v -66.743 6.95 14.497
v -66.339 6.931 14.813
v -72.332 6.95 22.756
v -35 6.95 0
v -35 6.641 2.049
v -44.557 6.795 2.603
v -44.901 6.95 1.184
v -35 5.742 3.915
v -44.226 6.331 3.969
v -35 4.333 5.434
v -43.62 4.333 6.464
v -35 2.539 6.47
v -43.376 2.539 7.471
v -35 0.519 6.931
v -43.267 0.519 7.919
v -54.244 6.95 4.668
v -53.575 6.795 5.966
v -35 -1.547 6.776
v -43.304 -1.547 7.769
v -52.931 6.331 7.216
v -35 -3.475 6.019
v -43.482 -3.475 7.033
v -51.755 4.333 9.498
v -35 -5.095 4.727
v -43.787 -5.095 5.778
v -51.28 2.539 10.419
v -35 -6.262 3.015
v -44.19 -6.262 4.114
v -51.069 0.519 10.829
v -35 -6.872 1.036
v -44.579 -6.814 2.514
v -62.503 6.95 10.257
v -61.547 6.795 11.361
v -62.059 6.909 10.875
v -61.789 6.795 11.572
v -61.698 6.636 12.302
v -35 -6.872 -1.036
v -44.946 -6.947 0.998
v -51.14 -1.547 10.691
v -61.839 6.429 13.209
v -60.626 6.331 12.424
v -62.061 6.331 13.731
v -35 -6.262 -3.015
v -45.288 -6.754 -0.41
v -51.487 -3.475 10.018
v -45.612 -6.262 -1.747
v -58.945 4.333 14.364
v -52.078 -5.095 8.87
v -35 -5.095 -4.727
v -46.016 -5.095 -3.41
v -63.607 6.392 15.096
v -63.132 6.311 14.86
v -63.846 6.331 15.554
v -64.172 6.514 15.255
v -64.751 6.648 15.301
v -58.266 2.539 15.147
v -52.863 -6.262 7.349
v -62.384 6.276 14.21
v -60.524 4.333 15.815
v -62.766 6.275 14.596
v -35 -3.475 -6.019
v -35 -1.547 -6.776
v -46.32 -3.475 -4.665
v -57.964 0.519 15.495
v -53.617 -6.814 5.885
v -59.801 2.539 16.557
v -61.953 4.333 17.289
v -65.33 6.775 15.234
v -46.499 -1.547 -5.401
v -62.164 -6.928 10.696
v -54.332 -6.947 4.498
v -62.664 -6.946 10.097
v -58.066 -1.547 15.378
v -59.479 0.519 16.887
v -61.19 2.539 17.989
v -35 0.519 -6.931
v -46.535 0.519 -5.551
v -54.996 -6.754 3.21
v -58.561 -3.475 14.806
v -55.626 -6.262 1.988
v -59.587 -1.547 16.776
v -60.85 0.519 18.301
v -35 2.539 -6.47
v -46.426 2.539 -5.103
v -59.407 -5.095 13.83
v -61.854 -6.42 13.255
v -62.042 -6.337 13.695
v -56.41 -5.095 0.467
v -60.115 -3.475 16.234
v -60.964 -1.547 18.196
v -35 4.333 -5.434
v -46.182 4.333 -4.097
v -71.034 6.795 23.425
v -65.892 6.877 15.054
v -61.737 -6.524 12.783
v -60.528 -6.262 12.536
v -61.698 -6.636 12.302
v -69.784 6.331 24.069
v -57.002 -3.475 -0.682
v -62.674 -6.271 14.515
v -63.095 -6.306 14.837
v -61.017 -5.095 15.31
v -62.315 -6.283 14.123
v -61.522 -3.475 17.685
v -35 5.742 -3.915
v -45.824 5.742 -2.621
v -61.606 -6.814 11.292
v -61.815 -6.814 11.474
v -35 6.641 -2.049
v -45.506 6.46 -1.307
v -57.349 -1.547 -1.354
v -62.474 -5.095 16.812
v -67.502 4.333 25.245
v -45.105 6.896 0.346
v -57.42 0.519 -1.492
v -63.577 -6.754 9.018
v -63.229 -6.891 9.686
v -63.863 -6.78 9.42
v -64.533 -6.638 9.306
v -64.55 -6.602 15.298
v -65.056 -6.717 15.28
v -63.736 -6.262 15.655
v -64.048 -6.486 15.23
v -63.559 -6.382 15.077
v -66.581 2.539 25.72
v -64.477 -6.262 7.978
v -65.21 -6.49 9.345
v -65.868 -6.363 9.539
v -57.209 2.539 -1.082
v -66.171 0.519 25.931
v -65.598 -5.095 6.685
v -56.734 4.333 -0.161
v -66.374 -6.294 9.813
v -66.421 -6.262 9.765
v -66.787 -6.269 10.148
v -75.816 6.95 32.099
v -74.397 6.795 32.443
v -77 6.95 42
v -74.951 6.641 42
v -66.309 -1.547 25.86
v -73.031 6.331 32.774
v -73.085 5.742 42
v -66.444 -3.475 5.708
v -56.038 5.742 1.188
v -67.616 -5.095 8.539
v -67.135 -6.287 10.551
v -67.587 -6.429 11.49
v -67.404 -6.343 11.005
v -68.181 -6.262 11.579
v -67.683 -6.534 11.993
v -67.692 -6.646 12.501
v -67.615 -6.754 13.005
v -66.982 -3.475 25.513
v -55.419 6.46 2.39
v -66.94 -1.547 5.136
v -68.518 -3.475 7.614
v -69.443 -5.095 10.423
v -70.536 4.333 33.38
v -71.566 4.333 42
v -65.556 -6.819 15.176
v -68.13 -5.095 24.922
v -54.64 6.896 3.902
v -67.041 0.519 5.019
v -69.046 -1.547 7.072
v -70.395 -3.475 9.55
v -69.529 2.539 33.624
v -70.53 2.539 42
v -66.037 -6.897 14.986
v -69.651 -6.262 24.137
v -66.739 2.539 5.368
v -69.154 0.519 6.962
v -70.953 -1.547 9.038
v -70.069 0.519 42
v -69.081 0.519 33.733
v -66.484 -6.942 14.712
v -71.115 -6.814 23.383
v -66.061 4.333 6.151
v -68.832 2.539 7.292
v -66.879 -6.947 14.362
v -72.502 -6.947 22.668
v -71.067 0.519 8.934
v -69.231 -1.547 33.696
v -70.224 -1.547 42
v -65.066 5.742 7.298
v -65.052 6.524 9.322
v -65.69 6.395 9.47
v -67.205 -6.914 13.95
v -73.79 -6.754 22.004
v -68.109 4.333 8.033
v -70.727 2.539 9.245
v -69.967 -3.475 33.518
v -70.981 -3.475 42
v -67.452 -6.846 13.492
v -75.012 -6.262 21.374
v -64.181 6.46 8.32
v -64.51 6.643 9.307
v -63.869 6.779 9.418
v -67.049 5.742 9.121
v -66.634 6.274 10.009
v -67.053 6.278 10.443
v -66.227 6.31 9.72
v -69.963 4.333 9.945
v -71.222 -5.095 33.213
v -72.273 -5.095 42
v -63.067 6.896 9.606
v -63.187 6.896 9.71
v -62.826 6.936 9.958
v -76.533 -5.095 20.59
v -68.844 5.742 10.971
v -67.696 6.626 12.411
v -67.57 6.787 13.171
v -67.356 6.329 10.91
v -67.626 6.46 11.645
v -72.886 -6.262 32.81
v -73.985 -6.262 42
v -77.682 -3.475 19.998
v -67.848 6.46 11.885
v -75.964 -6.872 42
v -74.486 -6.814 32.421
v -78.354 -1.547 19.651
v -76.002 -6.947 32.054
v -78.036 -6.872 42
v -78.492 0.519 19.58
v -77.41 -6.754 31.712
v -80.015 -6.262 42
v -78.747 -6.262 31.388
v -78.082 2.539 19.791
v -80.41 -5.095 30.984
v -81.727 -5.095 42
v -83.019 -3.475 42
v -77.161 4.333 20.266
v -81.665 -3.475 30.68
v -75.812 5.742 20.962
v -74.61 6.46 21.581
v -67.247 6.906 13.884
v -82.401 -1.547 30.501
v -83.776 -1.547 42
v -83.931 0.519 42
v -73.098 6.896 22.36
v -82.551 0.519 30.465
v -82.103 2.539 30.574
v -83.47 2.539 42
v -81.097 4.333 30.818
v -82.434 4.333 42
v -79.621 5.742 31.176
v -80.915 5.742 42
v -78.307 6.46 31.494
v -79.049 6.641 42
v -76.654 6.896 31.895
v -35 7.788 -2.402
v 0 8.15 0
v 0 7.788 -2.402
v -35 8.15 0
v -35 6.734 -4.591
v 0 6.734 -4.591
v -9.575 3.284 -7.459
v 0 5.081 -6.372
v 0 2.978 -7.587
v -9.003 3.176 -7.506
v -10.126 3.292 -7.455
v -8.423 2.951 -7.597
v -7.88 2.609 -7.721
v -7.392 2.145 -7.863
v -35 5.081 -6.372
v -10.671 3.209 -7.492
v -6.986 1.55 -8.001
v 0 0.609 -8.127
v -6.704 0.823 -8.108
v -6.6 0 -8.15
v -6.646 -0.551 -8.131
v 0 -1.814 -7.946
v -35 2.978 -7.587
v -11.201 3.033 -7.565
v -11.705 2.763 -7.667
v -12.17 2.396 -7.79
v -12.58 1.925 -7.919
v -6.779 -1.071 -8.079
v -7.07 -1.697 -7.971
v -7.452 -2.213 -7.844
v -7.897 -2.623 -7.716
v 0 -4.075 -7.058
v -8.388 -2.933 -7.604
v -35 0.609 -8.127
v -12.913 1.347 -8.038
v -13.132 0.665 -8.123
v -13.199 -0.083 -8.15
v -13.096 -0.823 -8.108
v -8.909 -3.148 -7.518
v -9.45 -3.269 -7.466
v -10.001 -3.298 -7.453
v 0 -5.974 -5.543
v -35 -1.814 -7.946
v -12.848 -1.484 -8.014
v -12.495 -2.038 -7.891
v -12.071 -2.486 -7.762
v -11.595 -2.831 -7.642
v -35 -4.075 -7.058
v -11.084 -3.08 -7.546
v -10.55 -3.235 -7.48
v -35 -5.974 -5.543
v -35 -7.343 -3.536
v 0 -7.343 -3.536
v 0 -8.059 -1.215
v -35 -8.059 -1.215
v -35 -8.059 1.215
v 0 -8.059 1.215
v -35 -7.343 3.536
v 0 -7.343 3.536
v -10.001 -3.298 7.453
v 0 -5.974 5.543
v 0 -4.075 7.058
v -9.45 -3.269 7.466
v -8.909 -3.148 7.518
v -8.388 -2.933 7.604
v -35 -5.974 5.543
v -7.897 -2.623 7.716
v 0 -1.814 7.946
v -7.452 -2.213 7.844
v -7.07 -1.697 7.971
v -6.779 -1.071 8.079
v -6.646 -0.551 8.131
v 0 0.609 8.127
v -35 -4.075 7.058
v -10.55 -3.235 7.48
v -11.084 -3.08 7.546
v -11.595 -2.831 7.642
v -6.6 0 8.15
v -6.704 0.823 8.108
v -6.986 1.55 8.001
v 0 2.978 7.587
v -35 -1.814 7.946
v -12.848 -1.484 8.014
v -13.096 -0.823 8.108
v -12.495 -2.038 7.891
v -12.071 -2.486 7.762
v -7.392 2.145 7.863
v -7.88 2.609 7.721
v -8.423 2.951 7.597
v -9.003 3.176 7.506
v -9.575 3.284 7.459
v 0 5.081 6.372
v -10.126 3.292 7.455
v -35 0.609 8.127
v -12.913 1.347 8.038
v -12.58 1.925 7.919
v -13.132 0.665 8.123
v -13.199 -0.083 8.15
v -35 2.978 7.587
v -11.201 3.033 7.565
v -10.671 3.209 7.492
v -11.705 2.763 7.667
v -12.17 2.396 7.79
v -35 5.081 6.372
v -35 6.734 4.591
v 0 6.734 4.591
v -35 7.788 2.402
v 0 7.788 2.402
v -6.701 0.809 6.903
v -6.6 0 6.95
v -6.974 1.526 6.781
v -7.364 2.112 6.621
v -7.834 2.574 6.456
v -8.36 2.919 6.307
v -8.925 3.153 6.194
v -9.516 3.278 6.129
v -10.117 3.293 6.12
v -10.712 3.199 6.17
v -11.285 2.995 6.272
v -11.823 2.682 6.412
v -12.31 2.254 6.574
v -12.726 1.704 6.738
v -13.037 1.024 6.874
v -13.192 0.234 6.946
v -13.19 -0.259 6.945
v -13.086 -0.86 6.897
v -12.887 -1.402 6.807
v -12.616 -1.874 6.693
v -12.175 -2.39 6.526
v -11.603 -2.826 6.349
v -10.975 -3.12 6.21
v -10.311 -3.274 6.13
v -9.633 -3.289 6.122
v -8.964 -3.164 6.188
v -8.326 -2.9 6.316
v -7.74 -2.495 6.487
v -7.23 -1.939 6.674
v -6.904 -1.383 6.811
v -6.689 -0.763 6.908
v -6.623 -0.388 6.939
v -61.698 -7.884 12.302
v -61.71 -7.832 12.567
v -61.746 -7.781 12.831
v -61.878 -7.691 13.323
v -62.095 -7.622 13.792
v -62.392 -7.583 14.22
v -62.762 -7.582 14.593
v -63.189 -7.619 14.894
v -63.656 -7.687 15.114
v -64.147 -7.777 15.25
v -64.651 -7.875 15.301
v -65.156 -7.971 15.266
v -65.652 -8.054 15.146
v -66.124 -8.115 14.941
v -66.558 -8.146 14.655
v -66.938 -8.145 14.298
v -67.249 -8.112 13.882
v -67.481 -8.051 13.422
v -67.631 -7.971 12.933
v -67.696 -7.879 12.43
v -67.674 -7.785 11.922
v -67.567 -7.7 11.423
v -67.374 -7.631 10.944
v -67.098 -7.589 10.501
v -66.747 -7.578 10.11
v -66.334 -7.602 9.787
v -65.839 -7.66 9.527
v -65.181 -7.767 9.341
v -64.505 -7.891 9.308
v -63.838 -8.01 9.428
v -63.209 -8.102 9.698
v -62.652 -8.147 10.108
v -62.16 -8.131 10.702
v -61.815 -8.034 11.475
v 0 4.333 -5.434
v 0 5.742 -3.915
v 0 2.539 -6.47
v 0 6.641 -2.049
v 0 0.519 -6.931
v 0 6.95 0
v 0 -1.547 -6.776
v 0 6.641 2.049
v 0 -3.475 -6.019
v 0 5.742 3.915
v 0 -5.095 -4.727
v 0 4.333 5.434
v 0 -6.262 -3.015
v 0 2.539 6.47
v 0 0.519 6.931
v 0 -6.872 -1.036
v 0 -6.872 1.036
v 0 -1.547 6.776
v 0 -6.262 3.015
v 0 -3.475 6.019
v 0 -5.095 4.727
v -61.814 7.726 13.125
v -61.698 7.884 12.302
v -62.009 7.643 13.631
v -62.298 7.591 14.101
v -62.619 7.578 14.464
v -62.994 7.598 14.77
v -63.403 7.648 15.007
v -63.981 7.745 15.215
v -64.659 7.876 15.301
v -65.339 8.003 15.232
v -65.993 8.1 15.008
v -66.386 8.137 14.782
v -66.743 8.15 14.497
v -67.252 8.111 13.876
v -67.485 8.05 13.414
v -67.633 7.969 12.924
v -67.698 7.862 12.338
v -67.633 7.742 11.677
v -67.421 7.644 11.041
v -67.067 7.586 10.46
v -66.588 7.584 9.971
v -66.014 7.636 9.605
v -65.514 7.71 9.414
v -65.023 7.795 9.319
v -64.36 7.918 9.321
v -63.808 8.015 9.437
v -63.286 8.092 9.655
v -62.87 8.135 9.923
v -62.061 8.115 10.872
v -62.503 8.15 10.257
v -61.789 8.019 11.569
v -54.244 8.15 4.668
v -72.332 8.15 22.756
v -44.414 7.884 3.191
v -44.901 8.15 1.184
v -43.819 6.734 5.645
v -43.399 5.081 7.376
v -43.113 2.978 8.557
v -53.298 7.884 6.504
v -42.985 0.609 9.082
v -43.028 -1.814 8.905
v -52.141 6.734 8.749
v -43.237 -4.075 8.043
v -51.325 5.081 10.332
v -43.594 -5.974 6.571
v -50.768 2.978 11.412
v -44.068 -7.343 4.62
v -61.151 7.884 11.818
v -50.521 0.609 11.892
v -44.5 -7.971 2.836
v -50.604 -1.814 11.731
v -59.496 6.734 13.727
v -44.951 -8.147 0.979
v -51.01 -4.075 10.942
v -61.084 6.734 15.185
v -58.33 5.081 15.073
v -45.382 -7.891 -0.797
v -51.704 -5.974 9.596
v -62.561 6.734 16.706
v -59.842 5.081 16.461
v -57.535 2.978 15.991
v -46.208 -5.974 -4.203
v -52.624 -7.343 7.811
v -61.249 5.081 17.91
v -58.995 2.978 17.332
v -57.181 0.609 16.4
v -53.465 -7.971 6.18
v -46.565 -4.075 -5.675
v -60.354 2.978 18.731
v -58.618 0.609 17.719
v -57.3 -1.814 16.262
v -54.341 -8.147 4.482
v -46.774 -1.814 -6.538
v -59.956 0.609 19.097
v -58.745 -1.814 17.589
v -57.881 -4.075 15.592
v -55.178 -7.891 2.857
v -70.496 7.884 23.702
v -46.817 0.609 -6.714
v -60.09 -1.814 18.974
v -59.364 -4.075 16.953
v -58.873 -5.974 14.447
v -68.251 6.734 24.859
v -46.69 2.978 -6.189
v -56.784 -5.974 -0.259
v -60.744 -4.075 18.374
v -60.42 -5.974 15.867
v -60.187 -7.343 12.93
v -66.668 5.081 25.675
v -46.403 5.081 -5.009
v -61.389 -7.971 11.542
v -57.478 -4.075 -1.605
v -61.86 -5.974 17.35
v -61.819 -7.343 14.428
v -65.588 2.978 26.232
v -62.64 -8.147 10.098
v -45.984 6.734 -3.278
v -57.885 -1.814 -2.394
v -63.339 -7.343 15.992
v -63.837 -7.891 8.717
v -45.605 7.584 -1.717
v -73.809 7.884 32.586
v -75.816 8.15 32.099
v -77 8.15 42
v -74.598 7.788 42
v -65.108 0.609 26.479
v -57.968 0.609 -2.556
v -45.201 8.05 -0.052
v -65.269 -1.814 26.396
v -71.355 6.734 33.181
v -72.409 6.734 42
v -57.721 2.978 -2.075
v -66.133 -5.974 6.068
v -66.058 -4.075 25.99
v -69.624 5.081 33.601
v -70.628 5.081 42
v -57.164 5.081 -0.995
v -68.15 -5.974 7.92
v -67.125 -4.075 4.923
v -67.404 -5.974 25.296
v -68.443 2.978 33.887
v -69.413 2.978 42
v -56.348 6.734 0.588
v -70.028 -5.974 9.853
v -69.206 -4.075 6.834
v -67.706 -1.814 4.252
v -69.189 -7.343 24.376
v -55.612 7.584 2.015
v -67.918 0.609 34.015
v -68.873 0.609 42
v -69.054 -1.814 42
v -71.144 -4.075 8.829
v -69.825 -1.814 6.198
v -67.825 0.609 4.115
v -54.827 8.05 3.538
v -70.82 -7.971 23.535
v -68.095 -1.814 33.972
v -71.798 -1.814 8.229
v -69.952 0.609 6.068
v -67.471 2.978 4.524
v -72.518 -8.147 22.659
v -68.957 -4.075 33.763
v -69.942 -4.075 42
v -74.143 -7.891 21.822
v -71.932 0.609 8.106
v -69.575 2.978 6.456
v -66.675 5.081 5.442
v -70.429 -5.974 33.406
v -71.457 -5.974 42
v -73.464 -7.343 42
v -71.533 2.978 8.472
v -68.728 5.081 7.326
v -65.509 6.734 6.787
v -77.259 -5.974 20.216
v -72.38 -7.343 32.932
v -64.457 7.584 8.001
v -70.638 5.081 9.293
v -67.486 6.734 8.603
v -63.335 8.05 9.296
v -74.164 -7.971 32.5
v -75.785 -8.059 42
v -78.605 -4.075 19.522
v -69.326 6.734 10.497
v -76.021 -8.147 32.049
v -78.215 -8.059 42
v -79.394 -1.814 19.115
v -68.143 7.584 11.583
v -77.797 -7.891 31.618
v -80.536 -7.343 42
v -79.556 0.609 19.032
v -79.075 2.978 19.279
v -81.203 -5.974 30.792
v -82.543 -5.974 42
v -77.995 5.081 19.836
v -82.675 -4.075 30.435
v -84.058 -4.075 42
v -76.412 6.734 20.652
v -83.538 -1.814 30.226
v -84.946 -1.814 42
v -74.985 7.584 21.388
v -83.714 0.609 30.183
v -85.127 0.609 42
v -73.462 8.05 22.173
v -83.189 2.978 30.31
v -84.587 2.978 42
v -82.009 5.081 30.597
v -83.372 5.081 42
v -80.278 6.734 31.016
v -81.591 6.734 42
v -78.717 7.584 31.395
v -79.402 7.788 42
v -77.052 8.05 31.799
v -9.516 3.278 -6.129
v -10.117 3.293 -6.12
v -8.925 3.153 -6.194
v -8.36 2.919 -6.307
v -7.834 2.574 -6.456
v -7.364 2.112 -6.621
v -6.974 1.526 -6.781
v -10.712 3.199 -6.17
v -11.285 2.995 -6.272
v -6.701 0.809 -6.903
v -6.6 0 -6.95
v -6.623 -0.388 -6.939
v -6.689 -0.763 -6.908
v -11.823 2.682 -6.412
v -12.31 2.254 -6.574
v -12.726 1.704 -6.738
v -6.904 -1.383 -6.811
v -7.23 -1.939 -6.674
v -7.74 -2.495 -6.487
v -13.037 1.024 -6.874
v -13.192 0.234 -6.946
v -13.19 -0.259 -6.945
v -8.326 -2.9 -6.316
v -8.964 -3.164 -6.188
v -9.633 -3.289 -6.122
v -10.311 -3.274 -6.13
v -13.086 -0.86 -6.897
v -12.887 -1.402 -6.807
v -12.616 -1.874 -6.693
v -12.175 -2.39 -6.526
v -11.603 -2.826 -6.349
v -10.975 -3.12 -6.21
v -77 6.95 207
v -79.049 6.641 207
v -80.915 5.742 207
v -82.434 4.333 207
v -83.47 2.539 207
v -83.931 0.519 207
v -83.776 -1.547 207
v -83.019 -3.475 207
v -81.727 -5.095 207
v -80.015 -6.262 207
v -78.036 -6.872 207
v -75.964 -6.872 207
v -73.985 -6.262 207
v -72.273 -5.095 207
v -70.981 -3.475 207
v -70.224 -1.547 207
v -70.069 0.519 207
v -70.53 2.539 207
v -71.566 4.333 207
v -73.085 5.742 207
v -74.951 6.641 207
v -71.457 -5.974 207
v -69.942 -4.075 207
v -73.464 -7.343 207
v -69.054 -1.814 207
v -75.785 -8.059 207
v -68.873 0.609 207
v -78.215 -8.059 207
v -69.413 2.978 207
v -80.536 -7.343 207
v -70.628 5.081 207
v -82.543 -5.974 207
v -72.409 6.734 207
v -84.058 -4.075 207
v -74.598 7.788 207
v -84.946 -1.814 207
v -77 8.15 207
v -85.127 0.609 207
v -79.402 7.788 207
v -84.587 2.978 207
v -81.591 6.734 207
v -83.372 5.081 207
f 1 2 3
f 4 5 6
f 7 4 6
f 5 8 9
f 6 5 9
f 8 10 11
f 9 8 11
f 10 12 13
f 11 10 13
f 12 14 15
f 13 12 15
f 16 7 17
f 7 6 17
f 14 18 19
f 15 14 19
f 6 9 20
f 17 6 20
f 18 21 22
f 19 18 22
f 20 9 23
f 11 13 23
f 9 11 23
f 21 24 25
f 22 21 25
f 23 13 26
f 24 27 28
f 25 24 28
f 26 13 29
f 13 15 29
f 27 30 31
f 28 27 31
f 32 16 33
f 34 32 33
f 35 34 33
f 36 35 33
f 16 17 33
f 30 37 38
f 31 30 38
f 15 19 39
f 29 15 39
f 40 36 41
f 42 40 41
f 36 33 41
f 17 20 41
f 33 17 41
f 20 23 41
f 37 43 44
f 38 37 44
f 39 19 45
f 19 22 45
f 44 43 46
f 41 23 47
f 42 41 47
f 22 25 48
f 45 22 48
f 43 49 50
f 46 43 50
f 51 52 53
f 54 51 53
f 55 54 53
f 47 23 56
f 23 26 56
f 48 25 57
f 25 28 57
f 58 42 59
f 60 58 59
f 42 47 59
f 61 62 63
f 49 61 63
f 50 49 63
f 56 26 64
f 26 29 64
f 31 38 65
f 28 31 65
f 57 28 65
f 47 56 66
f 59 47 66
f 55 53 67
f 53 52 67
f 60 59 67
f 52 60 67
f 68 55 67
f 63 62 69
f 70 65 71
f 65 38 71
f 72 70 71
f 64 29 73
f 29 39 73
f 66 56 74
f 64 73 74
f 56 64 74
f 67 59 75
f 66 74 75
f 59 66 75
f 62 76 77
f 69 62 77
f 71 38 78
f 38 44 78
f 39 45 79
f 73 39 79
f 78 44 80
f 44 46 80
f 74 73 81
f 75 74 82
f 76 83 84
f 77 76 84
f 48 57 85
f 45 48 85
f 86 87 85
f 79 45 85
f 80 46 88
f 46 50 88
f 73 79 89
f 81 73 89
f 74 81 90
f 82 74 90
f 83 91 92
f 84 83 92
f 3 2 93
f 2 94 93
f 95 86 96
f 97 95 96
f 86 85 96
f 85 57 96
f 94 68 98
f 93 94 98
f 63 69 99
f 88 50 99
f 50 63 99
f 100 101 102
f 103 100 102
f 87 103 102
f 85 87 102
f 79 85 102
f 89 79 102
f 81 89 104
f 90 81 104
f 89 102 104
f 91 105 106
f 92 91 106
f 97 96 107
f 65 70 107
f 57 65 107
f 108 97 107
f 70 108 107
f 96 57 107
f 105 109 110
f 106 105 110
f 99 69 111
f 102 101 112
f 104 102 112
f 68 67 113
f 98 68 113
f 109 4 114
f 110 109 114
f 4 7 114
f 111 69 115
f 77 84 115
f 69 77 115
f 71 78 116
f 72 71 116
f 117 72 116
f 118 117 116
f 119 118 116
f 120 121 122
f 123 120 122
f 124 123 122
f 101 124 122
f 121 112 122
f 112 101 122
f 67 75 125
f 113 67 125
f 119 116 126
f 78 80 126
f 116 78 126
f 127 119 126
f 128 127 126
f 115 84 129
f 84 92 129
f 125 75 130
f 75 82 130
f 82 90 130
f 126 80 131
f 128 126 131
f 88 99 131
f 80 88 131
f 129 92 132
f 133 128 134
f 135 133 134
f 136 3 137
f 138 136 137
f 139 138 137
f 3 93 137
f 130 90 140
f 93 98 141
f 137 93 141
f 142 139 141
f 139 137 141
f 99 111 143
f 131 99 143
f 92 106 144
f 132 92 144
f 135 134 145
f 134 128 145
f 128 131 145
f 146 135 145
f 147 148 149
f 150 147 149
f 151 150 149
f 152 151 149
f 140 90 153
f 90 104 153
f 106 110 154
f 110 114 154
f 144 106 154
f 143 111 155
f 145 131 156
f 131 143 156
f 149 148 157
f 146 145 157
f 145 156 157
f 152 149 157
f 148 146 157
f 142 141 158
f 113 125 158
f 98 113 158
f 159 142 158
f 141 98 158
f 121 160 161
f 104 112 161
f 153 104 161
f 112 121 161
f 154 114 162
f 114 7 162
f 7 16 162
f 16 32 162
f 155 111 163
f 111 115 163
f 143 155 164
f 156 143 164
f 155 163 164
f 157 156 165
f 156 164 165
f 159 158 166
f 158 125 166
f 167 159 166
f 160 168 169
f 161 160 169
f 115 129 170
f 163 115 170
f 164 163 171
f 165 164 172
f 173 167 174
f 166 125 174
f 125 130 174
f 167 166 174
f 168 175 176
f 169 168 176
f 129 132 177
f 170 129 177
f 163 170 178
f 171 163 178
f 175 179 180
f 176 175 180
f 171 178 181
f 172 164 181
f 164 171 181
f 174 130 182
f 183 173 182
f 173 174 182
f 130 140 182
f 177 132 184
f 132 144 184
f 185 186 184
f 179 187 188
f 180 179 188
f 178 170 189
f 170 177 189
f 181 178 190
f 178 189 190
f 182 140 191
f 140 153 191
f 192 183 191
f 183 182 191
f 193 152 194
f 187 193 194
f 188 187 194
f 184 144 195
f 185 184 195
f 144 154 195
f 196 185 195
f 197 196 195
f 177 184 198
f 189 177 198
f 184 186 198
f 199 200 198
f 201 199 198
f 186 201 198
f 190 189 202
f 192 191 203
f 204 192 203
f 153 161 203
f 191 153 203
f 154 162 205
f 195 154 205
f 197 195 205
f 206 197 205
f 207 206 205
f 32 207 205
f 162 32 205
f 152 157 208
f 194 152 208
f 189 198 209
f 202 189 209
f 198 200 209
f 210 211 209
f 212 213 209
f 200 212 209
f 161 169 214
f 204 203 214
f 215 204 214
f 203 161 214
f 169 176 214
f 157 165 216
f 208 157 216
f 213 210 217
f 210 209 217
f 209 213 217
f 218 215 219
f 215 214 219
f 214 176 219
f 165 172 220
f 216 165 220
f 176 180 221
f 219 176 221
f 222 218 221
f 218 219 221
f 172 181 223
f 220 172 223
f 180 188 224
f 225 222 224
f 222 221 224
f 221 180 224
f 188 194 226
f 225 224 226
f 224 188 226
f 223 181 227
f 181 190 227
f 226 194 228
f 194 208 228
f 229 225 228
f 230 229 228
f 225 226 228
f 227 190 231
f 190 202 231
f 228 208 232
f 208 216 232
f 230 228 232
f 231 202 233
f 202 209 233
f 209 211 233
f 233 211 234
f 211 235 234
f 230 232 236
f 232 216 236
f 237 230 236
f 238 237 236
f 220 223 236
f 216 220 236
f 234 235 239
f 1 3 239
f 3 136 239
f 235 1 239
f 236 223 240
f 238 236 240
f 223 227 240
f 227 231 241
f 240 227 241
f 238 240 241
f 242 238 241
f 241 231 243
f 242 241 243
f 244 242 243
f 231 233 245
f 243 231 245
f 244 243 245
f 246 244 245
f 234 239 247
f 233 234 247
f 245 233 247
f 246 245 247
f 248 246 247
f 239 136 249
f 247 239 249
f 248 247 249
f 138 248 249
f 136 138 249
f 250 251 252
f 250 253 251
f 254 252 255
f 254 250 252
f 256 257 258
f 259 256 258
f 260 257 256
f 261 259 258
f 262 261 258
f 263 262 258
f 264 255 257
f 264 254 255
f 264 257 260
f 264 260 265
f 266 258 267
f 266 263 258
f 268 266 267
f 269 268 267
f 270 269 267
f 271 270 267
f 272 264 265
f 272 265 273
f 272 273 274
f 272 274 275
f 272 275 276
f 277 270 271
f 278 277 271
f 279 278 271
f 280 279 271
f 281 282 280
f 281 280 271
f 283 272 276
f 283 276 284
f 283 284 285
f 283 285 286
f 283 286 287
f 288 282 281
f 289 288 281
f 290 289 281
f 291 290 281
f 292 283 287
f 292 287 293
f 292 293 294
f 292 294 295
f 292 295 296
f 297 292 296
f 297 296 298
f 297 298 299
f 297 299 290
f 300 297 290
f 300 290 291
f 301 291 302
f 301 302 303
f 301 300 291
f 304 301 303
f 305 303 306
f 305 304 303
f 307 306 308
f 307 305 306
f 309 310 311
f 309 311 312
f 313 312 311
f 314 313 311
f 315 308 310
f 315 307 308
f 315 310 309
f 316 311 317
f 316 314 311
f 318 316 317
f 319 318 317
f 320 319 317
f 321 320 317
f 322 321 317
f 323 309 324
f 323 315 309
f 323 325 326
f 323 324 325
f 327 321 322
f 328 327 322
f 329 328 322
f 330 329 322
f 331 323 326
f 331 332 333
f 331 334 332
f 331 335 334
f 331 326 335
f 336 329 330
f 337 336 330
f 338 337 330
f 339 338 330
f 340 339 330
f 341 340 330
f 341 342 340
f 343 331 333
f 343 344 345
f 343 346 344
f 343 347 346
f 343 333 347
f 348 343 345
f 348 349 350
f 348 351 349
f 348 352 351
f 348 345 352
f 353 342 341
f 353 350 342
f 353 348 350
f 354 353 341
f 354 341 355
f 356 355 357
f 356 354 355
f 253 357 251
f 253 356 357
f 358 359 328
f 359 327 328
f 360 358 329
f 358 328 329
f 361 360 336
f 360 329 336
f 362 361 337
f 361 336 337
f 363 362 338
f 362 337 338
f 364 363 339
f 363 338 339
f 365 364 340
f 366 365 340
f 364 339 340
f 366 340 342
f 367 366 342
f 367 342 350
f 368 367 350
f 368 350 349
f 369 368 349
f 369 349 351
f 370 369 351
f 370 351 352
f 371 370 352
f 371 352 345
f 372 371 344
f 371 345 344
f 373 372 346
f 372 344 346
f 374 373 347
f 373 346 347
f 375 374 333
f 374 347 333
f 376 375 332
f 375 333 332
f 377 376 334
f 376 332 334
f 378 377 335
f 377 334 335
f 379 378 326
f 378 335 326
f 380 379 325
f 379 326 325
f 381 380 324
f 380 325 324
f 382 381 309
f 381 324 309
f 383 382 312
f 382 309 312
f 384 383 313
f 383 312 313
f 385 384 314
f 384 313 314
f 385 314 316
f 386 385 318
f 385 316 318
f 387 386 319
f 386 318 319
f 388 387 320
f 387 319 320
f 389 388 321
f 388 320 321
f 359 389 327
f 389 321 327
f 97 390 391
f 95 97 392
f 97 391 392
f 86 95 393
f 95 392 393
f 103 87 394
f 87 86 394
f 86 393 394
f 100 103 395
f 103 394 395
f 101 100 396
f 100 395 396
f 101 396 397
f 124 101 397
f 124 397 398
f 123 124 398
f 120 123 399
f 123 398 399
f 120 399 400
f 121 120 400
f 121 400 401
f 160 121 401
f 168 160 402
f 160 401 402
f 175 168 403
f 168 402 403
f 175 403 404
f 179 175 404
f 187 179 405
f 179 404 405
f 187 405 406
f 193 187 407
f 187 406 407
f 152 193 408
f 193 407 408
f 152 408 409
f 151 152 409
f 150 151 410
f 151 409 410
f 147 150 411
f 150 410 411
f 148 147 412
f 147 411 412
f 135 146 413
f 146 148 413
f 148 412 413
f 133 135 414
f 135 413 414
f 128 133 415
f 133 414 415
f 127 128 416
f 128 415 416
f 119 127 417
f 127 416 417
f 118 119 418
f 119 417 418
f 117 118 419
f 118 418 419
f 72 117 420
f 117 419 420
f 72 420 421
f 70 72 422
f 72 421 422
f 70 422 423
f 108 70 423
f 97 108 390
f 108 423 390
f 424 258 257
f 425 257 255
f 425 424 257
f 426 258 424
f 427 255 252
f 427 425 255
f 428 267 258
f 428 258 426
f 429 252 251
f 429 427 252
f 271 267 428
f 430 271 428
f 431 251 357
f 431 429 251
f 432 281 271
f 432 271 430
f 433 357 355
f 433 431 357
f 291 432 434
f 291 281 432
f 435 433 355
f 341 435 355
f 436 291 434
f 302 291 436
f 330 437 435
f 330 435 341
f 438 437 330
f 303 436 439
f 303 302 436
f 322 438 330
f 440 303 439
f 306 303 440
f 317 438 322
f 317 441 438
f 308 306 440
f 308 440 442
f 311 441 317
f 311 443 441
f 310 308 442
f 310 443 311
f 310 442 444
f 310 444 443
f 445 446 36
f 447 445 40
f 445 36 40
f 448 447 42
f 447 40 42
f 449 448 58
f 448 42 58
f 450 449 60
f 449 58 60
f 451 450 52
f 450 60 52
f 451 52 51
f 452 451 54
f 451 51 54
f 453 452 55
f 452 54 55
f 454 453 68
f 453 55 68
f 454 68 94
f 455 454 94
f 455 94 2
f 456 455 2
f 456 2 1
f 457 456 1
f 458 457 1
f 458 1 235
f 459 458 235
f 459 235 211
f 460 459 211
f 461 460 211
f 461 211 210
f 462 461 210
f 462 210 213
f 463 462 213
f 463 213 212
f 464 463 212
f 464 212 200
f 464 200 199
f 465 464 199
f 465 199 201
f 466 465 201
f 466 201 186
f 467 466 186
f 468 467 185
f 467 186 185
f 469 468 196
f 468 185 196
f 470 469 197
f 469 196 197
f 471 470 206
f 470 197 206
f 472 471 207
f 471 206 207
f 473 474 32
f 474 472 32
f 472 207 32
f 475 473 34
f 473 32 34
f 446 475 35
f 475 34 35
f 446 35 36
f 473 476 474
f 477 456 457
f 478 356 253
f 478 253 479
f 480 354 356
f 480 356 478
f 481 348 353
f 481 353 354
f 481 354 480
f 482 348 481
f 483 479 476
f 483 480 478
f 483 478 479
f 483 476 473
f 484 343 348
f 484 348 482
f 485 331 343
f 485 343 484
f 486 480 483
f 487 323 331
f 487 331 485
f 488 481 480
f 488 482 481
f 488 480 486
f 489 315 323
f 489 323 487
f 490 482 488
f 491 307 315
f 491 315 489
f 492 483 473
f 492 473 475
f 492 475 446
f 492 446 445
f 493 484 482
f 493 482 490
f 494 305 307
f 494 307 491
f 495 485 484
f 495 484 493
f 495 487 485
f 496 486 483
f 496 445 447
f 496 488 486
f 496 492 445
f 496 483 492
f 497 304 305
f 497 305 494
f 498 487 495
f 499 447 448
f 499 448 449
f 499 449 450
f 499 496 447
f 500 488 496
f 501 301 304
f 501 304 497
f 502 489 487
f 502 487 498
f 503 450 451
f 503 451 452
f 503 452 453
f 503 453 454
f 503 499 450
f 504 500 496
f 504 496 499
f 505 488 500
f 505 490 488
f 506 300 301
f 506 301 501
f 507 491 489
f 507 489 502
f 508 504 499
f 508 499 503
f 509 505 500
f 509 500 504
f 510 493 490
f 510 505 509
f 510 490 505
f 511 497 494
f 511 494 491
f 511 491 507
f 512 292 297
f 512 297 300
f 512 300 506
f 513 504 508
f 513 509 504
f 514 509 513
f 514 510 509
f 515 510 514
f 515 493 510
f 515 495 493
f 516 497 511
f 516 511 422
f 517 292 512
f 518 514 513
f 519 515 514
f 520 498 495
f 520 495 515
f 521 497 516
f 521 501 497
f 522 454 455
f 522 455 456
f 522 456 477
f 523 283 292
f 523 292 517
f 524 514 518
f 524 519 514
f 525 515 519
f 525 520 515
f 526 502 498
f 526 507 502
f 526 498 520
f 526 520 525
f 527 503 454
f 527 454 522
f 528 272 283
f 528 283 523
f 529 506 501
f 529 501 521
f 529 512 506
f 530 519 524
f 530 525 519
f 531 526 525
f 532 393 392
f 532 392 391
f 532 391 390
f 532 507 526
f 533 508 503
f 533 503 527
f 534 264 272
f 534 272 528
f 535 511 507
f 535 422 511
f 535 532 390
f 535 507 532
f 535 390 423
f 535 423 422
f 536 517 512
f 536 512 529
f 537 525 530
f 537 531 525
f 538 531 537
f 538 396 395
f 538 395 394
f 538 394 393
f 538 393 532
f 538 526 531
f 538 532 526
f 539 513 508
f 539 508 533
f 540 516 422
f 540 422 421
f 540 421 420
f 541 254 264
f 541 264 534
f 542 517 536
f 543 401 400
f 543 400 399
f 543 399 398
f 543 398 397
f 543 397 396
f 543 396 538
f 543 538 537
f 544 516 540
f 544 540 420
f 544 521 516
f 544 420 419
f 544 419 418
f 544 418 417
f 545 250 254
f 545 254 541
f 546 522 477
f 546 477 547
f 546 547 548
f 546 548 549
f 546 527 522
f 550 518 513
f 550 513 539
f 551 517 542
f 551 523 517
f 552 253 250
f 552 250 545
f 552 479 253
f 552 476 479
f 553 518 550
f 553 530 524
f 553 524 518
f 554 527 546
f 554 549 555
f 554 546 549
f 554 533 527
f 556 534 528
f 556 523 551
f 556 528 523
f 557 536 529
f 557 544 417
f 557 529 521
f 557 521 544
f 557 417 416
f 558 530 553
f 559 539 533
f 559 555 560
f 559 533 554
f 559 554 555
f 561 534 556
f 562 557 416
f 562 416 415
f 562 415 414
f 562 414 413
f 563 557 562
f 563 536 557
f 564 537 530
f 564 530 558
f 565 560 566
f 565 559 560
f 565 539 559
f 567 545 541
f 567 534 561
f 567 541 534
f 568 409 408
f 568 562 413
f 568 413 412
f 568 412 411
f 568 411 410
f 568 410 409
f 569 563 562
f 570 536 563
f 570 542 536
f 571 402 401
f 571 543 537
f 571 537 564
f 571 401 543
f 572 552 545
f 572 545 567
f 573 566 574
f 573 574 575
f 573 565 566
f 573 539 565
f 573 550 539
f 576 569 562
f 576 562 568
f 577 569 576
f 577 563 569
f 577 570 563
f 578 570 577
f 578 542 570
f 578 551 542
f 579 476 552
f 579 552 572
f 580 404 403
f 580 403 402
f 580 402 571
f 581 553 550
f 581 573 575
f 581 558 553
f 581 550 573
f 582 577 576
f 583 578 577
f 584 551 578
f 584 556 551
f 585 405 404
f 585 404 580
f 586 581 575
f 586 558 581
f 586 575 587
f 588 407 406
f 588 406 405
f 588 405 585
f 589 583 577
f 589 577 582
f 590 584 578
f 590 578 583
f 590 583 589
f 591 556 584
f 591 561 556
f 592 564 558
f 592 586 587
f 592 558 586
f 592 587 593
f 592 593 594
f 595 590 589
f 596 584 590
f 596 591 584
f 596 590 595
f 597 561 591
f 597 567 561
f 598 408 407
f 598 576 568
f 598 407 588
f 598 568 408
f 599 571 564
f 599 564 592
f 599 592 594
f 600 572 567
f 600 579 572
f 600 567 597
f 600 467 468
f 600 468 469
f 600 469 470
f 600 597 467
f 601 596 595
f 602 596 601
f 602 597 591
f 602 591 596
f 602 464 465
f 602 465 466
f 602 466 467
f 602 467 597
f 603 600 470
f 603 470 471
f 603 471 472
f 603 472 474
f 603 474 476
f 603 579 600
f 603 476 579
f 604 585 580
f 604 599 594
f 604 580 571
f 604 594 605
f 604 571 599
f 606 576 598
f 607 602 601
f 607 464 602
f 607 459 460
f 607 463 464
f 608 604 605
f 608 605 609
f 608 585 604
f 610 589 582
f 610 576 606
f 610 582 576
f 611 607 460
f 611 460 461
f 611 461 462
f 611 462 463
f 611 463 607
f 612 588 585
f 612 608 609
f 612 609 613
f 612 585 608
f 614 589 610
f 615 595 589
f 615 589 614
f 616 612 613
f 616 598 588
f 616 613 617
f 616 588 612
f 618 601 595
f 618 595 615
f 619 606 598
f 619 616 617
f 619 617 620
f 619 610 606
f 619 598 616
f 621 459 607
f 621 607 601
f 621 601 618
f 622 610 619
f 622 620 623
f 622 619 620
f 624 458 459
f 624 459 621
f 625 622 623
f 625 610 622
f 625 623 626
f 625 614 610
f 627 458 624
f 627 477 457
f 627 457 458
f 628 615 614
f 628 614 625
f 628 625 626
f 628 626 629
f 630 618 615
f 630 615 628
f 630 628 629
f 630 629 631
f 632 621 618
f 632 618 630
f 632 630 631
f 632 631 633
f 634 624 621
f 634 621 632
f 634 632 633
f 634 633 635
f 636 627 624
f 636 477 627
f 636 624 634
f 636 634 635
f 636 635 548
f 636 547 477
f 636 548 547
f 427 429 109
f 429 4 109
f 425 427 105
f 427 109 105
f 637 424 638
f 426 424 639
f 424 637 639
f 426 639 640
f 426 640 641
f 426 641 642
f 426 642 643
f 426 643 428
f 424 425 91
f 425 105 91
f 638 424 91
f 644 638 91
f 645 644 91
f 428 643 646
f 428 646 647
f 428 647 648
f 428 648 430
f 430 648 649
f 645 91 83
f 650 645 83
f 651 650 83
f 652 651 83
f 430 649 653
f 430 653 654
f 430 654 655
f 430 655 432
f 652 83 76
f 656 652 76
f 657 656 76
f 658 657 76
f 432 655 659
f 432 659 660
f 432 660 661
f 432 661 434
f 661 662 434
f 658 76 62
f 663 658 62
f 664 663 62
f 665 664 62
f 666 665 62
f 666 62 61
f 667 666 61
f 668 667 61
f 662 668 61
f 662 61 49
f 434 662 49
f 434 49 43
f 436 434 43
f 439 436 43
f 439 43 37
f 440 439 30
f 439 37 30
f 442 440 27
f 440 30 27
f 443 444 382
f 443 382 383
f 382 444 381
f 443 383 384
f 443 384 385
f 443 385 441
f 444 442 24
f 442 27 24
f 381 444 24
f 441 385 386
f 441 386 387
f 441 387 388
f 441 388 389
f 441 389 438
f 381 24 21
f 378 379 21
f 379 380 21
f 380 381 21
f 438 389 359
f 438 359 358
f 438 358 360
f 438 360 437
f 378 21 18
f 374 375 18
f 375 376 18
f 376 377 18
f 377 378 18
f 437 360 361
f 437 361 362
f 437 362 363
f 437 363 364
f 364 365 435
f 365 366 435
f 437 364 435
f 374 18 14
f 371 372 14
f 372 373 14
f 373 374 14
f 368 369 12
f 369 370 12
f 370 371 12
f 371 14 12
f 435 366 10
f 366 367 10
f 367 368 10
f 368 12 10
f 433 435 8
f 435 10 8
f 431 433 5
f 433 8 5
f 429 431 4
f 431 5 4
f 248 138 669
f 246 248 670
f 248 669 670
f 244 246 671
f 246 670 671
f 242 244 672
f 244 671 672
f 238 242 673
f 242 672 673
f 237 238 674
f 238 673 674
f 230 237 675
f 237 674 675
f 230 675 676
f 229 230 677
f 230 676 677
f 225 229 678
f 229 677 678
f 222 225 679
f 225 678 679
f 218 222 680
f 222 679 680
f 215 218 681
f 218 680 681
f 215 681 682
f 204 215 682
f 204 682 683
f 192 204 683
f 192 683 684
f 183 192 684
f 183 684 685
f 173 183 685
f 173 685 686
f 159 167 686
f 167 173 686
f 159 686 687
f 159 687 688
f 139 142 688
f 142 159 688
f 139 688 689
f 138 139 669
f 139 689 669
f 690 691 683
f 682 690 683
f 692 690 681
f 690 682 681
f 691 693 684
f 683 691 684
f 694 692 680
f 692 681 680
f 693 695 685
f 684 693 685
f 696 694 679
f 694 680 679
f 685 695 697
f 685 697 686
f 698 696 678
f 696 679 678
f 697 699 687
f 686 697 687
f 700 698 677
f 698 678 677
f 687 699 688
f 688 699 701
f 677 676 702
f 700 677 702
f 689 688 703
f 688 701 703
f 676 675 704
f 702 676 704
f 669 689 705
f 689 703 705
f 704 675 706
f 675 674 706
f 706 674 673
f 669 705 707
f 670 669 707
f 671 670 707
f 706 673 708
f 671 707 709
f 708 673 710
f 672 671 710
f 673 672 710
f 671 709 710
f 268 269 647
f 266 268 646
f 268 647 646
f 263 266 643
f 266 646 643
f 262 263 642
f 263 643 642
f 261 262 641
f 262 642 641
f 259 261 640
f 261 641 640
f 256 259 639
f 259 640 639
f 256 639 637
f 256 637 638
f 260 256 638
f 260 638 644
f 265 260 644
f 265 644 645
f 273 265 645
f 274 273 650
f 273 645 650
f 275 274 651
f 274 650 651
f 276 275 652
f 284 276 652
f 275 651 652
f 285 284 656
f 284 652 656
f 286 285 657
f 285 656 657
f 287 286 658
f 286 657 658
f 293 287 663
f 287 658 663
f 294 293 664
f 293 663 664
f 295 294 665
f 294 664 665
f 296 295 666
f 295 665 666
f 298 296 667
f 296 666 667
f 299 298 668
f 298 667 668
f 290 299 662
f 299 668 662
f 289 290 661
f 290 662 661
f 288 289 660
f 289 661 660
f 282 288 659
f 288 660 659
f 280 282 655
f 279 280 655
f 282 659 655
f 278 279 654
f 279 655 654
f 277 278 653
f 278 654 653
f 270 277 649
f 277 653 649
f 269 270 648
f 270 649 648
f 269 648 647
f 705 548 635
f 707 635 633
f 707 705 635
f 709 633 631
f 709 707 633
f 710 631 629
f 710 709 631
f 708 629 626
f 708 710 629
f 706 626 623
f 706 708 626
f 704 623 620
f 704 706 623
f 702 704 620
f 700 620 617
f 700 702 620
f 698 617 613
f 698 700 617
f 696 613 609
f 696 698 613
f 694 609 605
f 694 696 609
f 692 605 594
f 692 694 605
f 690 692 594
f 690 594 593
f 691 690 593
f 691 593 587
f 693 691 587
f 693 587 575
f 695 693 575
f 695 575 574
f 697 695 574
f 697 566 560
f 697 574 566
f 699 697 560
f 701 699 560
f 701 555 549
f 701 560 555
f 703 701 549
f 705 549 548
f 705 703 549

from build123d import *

# Parameters (mm, degrees)
F1_R     = 8.15
F1_R_2   = 6.95
F3_R     = 3
F4_DEPTH = 12.5
F5_R     = 3.3
F6_DEPTH = 12.5


with BuildPart() as f2:
    # F2: sweep along a path in F0
    with BuildLine(Plane.XZ) as f2_path:
        Line((0, 0), (-35, 0))
        ThreePointArc((-35, 0), (-64.6984848098, 12.3015151902), (-77, 42))
        Line((-77, 42), (-77, 207))
    # F1 (on Right) → F2 (sweep)
    with BuildSketch(Plane.YZ):
        Circle(F1_R)
        Circle(F1_R_2, mode=Mode.SUBTRACT)
    sweep(path=f2_path.line)

    # F3 (on Front) → F4 (cut, symmetric)
    with BuildSketch(Plane.XZ):
        with Locations((-64.6984848098, 12.3015151902)):
            Circle(F3_R)
    extrude(amount=F4_DEPTH, both=True, mode=Mode.SUBTRACT)

    # F5 (on Top) → F6 (cut, symmetric)
    with BuildSketch(Plane.XY):
        with Locations((-9.9, 0)):
            Circle(F5_R)
    extrude(amount=F6_DEPTH, both=True, mode=Mode.SUBTRACT)


solid = f2.part
